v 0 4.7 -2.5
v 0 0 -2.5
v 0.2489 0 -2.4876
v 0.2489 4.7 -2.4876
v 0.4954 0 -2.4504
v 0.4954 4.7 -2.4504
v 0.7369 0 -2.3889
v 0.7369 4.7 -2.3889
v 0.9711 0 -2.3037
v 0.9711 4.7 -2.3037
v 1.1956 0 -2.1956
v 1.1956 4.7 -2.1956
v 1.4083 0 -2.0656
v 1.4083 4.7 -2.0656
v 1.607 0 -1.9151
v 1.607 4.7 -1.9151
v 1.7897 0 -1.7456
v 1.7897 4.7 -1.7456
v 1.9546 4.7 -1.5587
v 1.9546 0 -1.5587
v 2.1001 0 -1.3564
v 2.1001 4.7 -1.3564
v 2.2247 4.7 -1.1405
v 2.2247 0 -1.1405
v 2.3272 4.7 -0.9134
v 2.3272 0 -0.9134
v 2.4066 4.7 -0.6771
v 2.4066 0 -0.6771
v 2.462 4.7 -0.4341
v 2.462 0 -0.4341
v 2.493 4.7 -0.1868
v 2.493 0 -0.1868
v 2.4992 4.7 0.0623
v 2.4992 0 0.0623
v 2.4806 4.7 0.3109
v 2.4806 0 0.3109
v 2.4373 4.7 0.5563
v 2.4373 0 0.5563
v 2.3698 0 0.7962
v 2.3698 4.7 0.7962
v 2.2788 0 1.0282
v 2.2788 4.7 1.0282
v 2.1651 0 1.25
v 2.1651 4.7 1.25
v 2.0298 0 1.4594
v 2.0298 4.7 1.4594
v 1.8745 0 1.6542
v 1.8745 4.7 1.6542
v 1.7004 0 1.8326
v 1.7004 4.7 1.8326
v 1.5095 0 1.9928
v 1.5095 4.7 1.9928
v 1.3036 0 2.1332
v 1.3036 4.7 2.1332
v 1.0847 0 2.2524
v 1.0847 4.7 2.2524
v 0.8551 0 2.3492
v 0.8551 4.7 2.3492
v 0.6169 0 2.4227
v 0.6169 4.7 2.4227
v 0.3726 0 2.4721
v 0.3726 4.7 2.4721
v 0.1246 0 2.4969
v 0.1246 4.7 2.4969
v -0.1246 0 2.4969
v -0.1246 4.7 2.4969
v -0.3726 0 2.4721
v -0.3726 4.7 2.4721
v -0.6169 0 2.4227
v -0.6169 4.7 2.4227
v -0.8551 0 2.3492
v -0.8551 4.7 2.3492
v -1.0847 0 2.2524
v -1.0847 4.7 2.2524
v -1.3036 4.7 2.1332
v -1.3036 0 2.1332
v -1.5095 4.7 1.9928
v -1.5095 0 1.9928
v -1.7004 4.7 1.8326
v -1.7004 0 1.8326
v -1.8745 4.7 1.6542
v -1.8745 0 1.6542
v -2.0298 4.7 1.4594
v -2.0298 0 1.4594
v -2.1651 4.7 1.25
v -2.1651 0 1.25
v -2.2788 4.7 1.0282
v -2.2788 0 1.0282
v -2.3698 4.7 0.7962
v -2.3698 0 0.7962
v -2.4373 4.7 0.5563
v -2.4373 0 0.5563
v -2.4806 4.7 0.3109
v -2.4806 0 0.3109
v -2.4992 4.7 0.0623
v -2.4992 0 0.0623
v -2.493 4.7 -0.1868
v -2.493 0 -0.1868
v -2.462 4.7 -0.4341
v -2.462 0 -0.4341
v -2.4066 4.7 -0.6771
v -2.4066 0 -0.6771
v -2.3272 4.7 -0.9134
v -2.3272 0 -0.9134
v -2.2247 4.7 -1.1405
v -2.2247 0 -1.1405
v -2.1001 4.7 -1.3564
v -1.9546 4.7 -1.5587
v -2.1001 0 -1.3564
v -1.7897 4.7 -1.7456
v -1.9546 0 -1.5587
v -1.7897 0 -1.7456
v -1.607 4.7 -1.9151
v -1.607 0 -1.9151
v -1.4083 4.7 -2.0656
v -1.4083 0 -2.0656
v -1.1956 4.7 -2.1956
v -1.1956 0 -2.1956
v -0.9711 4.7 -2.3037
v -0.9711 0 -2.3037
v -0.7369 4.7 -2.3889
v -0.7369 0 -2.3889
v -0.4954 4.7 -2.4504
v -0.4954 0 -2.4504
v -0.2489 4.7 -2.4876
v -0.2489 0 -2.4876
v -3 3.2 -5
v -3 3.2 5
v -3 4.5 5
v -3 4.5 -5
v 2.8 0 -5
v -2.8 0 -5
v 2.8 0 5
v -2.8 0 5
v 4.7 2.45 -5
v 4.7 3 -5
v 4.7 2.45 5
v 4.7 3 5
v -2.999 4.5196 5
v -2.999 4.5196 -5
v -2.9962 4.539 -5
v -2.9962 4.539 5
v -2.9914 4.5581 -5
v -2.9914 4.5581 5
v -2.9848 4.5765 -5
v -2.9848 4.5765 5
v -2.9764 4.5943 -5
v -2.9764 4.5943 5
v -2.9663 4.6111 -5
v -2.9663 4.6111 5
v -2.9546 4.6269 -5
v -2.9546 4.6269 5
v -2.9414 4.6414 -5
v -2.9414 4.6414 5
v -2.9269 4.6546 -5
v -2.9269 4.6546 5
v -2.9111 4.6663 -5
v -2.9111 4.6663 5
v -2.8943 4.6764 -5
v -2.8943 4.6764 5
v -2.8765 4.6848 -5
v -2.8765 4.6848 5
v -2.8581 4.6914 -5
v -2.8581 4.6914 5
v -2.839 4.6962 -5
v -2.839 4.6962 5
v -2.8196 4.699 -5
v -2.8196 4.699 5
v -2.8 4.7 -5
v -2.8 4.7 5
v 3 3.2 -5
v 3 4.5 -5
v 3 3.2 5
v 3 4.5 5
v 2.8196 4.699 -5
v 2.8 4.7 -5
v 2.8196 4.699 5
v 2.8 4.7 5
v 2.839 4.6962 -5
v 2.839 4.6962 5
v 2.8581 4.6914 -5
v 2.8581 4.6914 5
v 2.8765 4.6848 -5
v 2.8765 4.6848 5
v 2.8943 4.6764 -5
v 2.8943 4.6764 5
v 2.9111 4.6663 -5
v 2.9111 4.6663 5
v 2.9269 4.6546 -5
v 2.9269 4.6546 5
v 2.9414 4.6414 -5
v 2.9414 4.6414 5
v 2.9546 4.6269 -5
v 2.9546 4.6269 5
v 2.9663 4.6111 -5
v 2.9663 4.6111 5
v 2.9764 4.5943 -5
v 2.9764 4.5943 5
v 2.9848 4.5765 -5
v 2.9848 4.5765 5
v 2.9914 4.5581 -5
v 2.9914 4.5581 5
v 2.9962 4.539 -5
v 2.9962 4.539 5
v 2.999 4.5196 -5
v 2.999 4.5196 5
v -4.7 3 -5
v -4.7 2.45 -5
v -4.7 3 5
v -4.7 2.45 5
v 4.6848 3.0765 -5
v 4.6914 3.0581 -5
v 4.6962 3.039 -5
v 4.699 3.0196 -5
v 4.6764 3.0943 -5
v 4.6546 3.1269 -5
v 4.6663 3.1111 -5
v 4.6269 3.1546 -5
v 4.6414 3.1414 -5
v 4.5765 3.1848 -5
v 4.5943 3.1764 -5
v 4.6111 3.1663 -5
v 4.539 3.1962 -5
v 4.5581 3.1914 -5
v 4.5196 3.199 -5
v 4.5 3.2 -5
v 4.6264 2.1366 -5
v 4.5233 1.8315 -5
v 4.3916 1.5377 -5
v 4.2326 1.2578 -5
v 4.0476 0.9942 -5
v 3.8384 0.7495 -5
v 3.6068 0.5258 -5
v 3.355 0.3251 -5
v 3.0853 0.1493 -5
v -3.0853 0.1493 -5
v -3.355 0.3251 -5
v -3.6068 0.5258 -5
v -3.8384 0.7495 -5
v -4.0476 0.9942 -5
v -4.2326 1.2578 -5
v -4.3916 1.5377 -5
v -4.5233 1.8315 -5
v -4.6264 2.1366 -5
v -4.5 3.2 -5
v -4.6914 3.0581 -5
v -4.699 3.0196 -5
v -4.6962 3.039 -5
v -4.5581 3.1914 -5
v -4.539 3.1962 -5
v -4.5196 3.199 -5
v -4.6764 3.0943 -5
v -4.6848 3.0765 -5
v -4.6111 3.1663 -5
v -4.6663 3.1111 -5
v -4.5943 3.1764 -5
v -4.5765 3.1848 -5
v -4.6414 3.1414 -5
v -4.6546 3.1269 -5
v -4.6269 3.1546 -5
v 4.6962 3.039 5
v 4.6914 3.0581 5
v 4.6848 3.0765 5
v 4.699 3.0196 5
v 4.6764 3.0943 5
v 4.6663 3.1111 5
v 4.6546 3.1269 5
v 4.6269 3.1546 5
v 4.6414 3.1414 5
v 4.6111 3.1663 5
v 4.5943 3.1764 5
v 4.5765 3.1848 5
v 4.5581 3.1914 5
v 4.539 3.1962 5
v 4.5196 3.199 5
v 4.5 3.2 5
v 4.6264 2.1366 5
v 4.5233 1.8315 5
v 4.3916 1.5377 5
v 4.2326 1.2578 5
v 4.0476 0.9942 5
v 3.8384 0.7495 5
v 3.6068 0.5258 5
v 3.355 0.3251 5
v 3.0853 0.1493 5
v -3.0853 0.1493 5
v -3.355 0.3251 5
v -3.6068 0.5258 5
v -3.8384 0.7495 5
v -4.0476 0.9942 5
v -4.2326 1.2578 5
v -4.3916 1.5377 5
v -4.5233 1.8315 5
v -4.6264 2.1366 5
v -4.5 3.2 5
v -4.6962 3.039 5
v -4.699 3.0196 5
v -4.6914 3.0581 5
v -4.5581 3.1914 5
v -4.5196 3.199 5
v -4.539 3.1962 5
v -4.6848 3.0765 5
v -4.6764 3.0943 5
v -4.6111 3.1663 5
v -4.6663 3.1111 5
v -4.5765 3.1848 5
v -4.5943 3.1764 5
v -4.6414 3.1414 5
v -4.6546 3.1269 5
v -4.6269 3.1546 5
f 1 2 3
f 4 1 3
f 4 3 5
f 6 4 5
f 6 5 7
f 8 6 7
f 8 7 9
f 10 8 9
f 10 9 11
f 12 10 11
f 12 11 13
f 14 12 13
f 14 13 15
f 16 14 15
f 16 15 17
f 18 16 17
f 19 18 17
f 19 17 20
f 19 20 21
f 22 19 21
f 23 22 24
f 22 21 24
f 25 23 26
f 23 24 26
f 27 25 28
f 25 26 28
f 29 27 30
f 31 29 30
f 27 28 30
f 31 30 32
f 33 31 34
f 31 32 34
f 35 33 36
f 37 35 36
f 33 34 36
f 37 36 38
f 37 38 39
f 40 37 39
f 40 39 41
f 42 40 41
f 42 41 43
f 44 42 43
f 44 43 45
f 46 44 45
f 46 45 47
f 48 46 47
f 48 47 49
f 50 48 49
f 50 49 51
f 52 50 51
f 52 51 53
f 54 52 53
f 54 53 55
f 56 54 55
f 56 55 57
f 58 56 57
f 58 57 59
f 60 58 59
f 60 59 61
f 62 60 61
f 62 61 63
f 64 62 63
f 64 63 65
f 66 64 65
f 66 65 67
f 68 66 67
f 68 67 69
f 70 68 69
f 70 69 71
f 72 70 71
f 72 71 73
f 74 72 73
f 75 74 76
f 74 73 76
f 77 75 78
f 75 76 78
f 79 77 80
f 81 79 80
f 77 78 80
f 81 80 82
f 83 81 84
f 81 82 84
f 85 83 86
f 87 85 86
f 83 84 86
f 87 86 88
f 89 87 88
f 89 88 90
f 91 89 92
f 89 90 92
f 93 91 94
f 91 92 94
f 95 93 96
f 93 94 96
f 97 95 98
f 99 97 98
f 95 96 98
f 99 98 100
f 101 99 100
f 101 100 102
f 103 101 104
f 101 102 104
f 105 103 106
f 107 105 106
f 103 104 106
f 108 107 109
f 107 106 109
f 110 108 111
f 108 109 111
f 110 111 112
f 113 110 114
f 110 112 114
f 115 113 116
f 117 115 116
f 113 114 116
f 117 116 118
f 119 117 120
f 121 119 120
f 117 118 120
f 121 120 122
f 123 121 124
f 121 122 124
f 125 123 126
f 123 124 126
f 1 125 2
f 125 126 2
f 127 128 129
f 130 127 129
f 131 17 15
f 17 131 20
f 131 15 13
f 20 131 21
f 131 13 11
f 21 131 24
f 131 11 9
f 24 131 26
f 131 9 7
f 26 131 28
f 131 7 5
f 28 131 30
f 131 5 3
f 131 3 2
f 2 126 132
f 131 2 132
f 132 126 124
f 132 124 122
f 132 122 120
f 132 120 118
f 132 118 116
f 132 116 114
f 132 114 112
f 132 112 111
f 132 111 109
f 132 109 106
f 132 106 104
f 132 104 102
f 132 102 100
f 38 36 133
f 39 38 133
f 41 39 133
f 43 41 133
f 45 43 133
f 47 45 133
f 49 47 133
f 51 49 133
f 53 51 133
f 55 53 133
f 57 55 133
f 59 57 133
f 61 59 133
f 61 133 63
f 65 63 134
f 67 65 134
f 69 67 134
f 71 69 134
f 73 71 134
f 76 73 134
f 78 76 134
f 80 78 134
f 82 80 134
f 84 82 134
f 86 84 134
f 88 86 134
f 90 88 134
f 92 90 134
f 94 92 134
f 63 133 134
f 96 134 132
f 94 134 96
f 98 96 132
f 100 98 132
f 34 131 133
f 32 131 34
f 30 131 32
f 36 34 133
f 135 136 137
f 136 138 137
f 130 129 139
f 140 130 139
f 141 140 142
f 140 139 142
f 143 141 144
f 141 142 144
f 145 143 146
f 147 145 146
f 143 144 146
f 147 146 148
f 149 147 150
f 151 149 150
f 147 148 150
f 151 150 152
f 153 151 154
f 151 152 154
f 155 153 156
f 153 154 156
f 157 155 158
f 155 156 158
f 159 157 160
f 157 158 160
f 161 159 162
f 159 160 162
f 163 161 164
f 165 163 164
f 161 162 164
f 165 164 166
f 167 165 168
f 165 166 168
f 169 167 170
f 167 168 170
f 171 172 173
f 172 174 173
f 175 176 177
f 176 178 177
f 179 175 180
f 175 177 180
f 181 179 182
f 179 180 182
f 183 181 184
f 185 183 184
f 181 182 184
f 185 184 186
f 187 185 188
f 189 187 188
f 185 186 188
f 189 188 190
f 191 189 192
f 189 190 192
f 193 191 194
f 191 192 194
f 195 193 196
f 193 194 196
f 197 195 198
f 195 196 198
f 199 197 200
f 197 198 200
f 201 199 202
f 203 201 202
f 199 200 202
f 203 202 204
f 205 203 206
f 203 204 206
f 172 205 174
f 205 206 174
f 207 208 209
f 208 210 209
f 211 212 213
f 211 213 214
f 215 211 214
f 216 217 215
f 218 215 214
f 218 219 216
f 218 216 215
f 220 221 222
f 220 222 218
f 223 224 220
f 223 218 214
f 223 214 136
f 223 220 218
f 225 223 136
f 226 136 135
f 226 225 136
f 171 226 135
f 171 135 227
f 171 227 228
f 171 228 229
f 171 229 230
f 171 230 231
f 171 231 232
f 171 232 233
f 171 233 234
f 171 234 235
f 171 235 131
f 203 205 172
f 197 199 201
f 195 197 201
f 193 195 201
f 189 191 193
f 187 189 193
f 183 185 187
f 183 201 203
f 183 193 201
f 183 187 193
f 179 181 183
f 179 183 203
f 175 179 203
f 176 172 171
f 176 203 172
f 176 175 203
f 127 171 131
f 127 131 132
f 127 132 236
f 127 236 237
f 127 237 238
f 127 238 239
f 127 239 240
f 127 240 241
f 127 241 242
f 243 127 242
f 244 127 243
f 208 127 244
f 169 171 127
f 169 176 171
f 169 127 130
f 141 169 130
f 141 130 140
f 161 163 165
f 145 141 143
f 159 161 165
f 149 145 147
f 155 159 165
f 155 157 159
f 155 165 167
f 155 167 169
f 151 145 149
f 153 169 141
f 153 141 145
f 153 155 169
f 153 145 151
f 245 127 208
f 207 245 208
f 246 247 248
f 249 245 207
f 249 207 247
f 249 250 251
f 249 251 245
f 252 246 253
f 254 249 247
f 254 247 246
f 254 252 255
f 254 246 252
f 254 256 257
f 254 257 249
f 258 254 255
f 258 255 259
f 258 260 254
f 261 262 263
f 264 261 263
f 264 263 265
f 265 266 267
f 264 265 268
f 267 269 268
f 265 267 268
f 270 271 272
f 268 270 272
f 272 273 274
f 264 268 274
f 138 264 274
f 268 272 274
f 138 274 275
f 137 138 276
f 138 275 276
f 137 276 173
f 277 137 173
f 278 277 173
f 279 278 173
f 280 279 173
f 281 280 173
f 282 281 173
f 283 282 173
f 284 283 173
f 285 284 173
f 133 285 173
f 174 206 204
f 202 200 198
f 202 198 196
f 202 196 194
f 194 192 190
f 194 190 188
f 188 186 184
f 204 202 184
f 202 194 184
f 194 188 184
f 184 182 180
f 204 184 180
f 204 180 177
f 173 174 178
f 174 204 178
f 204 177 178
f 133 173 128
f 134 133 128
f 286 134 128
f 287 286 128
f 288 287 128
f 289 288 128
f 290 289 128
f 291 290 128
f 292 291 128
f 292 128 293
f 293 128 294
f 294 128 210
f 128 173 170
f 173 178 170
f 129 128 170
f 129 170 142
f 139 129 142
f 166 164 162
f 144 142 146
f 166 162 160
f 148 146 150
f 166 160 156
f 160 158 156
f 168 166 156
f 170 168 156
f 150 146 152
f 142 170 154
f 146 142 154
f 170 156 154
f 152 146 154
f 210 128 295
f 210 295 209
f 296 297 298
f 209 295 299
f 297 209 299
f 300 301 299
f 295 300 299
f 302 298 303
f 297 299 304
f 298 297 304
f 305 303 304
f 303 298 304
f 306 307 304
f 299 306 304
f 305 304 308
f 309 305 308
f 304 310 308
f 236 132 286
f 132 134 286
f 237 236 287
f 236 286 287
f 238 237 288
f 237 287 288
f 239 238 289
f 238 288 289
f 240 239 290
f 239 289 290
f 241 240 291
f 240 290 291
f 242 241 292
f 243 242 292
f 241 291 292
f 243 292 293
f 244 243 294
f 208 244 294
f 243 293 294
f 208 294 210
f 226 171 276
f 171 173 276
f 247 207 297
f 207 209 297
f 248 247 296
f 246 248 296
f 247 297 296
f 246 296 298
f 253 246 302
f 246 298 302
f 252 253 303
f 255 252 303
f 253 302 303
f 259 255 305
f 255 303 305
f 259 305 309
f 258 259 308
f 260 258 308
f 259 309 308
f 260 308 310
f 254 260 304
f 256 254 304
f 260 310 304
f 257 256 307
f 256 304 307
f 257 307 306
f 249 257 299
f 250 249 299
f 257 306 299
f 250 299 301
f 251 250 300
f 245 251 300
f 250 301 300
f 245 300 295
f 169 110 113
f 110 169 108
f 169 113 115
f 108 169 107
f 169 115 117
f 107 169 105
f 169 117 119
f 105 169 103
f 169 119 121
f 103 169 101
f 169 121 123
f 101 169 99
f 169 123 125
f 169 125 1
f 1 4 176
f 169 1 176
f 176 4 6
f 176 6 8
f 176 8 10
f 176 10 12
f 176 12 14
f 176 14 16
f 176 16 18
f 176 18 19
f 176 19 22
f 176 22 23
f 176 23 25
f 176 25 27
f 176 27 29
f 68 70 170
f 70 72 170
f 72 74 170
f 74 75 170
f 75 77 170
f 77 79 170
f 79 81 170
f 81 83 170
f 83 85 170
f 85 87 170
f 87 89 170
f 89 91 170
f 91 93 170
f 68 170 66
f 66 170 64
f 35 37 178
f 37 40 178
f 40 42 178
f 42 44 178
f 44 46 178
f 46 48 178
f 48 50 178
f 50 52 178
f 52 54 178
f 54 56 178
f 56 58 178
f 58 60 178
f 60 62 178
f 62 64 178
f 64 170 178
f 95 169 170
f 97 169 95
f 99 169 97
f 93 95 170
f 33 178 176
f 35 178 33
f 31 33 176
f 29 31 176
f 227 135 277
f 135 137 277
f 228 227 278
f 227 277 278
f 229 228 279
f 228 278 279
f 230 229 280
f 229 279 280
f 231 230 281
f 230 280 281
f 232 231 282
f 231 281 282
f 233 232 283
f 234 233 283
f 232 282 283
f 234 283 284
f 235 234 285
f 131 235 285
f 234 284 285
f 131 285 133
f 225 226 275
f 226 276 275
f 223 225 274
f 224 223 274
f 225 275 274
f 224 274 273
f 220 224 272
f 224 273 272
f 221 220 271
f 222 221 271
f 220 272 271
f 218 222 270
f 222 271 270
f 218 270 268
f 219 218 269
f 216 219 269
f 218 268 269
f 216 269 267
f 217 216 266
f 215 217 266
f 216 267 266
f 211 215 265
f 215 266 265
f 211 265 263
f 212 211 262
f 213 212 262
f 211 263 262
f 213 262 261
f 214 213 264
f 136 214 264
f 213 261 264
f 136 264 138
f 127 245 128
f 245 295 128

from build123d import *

# Parameters (mm, degrees)
EXTRUDE_1_DEPTH        = 5
HOLE_WIZARD_M6_1_D     = 5
HOLE_WIZARD_M6_1_DEPTH = 15
HOLE_WIZARD_M6_1_TIP   = 1.502151548


with BuildPart() as part:
    # 草图1 → 凸台-拉伸1 (new, symmetric)
    with BuildSketch(Plane.XY):
        with BuildLine():
            Line((-2.8, 4.7), (2.8, 4.7))
            ThreePointArc((2.8, 4.7), (2.941421356, 4.641421356), (3, 4.5))
            Line((3, 4.5), (3, 3.2))
            Line((3, 3.2), (4.5, 3.2))
            ThreePointArc((4.5, 3.2), (4.641421356, 3.141421356), (4.7, 3))
            Line((4.7, 3), (4.7, 2.45))
            ThreePointArc((4.7, 2.45), (4.047583818, 0.994220712), (2.8, 0))
            Line((2.8, 0), (-2.8, 0))
            ThreePointArc((-2.8, 0), (-4.047583818, 0.994220712), (-4.7, 2.45))
            Line((-4.7, 2.45), (-4.7, 3))
            ThreePointArc((-4.7, 3), (-4.641421356, 3.141421356), (-4.5, 3.2))
            Line((-4.5, 3.2), (-3, 3.2))
            Line((-3, 3.2), (-3, 4.5))
            ThreePointArc((-3, 4.5), (-2.941421356, 4.641421356), (-2.8, 4.7))
        make_face()
    extrude(amount=EXTRUDE_1_DEPTH, both=True)

    # M6 螺纹孔1
    with Locations(Plane.ZX.offset(4.7)):
        with Locations((0, 0)):
            Hole(HOLE_WIZARD_M6_1_D / 2, depth=HOLE_WIZARD_M6_1_DEPTH)
            with Locations((0, 0, -(HOLE_WIZARD_M6_1_DEPTH + HOLE_WIZARD_M6_1_TIP / 2))):  # 118° drill point
                Cone(0, HOLE_WIZARD_M6_1_D / 2, HOLE_WIZARD_M6_1_TIP, mode=Mode.SUBTRACT)


solid = part.part
